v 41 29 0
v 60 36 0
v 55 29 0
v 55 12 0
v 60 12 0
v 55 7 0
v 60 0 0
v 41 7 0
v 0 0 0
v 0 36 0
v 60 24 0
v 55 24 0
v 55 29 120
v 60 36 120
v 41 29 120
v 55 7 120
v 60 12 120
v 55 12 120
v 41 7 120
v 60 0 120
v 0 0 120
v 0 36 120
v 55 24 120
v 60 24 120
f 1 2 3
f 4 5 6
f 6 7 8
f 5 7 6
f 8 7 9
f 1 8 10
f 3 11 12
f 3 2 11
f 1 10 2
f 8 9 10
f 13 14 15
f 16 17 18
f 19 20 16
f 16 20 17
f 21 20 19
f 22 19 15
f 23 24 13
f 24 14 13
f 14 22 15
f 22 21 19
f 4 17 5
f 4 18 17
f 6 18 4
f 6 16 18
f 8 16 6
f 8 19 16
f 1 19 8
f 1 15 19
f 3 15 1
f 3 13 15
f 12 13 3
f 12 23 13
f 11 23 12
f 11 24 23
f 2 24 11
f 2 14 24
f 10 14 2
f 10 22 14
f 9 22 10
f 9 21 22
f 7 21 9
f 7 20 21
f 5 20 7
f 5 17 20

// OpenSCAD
$fn = 32;

// ----------------------------------------------------------------------
// T-slot rail: 60 x 36 mm section, 120 mm long
// ----------------------------------------------------------------------

// --- parameters (mm) ---
profile_height = 120;     // extrusion height
profile_points = 12;      // points of the closed outline

profile = [[0, 0], [60, 0], [60, 12], [55, 12], [55, 7], [41, 7], [41, 29], [55, 29], [55, 24], [60, 24], [60, 36], [0, 36]];  // single closed polygon, 12 points, counter clockwise

// --- the one profile operation ---
linear_extrude(height = profile_height) polygon(points = profile);
